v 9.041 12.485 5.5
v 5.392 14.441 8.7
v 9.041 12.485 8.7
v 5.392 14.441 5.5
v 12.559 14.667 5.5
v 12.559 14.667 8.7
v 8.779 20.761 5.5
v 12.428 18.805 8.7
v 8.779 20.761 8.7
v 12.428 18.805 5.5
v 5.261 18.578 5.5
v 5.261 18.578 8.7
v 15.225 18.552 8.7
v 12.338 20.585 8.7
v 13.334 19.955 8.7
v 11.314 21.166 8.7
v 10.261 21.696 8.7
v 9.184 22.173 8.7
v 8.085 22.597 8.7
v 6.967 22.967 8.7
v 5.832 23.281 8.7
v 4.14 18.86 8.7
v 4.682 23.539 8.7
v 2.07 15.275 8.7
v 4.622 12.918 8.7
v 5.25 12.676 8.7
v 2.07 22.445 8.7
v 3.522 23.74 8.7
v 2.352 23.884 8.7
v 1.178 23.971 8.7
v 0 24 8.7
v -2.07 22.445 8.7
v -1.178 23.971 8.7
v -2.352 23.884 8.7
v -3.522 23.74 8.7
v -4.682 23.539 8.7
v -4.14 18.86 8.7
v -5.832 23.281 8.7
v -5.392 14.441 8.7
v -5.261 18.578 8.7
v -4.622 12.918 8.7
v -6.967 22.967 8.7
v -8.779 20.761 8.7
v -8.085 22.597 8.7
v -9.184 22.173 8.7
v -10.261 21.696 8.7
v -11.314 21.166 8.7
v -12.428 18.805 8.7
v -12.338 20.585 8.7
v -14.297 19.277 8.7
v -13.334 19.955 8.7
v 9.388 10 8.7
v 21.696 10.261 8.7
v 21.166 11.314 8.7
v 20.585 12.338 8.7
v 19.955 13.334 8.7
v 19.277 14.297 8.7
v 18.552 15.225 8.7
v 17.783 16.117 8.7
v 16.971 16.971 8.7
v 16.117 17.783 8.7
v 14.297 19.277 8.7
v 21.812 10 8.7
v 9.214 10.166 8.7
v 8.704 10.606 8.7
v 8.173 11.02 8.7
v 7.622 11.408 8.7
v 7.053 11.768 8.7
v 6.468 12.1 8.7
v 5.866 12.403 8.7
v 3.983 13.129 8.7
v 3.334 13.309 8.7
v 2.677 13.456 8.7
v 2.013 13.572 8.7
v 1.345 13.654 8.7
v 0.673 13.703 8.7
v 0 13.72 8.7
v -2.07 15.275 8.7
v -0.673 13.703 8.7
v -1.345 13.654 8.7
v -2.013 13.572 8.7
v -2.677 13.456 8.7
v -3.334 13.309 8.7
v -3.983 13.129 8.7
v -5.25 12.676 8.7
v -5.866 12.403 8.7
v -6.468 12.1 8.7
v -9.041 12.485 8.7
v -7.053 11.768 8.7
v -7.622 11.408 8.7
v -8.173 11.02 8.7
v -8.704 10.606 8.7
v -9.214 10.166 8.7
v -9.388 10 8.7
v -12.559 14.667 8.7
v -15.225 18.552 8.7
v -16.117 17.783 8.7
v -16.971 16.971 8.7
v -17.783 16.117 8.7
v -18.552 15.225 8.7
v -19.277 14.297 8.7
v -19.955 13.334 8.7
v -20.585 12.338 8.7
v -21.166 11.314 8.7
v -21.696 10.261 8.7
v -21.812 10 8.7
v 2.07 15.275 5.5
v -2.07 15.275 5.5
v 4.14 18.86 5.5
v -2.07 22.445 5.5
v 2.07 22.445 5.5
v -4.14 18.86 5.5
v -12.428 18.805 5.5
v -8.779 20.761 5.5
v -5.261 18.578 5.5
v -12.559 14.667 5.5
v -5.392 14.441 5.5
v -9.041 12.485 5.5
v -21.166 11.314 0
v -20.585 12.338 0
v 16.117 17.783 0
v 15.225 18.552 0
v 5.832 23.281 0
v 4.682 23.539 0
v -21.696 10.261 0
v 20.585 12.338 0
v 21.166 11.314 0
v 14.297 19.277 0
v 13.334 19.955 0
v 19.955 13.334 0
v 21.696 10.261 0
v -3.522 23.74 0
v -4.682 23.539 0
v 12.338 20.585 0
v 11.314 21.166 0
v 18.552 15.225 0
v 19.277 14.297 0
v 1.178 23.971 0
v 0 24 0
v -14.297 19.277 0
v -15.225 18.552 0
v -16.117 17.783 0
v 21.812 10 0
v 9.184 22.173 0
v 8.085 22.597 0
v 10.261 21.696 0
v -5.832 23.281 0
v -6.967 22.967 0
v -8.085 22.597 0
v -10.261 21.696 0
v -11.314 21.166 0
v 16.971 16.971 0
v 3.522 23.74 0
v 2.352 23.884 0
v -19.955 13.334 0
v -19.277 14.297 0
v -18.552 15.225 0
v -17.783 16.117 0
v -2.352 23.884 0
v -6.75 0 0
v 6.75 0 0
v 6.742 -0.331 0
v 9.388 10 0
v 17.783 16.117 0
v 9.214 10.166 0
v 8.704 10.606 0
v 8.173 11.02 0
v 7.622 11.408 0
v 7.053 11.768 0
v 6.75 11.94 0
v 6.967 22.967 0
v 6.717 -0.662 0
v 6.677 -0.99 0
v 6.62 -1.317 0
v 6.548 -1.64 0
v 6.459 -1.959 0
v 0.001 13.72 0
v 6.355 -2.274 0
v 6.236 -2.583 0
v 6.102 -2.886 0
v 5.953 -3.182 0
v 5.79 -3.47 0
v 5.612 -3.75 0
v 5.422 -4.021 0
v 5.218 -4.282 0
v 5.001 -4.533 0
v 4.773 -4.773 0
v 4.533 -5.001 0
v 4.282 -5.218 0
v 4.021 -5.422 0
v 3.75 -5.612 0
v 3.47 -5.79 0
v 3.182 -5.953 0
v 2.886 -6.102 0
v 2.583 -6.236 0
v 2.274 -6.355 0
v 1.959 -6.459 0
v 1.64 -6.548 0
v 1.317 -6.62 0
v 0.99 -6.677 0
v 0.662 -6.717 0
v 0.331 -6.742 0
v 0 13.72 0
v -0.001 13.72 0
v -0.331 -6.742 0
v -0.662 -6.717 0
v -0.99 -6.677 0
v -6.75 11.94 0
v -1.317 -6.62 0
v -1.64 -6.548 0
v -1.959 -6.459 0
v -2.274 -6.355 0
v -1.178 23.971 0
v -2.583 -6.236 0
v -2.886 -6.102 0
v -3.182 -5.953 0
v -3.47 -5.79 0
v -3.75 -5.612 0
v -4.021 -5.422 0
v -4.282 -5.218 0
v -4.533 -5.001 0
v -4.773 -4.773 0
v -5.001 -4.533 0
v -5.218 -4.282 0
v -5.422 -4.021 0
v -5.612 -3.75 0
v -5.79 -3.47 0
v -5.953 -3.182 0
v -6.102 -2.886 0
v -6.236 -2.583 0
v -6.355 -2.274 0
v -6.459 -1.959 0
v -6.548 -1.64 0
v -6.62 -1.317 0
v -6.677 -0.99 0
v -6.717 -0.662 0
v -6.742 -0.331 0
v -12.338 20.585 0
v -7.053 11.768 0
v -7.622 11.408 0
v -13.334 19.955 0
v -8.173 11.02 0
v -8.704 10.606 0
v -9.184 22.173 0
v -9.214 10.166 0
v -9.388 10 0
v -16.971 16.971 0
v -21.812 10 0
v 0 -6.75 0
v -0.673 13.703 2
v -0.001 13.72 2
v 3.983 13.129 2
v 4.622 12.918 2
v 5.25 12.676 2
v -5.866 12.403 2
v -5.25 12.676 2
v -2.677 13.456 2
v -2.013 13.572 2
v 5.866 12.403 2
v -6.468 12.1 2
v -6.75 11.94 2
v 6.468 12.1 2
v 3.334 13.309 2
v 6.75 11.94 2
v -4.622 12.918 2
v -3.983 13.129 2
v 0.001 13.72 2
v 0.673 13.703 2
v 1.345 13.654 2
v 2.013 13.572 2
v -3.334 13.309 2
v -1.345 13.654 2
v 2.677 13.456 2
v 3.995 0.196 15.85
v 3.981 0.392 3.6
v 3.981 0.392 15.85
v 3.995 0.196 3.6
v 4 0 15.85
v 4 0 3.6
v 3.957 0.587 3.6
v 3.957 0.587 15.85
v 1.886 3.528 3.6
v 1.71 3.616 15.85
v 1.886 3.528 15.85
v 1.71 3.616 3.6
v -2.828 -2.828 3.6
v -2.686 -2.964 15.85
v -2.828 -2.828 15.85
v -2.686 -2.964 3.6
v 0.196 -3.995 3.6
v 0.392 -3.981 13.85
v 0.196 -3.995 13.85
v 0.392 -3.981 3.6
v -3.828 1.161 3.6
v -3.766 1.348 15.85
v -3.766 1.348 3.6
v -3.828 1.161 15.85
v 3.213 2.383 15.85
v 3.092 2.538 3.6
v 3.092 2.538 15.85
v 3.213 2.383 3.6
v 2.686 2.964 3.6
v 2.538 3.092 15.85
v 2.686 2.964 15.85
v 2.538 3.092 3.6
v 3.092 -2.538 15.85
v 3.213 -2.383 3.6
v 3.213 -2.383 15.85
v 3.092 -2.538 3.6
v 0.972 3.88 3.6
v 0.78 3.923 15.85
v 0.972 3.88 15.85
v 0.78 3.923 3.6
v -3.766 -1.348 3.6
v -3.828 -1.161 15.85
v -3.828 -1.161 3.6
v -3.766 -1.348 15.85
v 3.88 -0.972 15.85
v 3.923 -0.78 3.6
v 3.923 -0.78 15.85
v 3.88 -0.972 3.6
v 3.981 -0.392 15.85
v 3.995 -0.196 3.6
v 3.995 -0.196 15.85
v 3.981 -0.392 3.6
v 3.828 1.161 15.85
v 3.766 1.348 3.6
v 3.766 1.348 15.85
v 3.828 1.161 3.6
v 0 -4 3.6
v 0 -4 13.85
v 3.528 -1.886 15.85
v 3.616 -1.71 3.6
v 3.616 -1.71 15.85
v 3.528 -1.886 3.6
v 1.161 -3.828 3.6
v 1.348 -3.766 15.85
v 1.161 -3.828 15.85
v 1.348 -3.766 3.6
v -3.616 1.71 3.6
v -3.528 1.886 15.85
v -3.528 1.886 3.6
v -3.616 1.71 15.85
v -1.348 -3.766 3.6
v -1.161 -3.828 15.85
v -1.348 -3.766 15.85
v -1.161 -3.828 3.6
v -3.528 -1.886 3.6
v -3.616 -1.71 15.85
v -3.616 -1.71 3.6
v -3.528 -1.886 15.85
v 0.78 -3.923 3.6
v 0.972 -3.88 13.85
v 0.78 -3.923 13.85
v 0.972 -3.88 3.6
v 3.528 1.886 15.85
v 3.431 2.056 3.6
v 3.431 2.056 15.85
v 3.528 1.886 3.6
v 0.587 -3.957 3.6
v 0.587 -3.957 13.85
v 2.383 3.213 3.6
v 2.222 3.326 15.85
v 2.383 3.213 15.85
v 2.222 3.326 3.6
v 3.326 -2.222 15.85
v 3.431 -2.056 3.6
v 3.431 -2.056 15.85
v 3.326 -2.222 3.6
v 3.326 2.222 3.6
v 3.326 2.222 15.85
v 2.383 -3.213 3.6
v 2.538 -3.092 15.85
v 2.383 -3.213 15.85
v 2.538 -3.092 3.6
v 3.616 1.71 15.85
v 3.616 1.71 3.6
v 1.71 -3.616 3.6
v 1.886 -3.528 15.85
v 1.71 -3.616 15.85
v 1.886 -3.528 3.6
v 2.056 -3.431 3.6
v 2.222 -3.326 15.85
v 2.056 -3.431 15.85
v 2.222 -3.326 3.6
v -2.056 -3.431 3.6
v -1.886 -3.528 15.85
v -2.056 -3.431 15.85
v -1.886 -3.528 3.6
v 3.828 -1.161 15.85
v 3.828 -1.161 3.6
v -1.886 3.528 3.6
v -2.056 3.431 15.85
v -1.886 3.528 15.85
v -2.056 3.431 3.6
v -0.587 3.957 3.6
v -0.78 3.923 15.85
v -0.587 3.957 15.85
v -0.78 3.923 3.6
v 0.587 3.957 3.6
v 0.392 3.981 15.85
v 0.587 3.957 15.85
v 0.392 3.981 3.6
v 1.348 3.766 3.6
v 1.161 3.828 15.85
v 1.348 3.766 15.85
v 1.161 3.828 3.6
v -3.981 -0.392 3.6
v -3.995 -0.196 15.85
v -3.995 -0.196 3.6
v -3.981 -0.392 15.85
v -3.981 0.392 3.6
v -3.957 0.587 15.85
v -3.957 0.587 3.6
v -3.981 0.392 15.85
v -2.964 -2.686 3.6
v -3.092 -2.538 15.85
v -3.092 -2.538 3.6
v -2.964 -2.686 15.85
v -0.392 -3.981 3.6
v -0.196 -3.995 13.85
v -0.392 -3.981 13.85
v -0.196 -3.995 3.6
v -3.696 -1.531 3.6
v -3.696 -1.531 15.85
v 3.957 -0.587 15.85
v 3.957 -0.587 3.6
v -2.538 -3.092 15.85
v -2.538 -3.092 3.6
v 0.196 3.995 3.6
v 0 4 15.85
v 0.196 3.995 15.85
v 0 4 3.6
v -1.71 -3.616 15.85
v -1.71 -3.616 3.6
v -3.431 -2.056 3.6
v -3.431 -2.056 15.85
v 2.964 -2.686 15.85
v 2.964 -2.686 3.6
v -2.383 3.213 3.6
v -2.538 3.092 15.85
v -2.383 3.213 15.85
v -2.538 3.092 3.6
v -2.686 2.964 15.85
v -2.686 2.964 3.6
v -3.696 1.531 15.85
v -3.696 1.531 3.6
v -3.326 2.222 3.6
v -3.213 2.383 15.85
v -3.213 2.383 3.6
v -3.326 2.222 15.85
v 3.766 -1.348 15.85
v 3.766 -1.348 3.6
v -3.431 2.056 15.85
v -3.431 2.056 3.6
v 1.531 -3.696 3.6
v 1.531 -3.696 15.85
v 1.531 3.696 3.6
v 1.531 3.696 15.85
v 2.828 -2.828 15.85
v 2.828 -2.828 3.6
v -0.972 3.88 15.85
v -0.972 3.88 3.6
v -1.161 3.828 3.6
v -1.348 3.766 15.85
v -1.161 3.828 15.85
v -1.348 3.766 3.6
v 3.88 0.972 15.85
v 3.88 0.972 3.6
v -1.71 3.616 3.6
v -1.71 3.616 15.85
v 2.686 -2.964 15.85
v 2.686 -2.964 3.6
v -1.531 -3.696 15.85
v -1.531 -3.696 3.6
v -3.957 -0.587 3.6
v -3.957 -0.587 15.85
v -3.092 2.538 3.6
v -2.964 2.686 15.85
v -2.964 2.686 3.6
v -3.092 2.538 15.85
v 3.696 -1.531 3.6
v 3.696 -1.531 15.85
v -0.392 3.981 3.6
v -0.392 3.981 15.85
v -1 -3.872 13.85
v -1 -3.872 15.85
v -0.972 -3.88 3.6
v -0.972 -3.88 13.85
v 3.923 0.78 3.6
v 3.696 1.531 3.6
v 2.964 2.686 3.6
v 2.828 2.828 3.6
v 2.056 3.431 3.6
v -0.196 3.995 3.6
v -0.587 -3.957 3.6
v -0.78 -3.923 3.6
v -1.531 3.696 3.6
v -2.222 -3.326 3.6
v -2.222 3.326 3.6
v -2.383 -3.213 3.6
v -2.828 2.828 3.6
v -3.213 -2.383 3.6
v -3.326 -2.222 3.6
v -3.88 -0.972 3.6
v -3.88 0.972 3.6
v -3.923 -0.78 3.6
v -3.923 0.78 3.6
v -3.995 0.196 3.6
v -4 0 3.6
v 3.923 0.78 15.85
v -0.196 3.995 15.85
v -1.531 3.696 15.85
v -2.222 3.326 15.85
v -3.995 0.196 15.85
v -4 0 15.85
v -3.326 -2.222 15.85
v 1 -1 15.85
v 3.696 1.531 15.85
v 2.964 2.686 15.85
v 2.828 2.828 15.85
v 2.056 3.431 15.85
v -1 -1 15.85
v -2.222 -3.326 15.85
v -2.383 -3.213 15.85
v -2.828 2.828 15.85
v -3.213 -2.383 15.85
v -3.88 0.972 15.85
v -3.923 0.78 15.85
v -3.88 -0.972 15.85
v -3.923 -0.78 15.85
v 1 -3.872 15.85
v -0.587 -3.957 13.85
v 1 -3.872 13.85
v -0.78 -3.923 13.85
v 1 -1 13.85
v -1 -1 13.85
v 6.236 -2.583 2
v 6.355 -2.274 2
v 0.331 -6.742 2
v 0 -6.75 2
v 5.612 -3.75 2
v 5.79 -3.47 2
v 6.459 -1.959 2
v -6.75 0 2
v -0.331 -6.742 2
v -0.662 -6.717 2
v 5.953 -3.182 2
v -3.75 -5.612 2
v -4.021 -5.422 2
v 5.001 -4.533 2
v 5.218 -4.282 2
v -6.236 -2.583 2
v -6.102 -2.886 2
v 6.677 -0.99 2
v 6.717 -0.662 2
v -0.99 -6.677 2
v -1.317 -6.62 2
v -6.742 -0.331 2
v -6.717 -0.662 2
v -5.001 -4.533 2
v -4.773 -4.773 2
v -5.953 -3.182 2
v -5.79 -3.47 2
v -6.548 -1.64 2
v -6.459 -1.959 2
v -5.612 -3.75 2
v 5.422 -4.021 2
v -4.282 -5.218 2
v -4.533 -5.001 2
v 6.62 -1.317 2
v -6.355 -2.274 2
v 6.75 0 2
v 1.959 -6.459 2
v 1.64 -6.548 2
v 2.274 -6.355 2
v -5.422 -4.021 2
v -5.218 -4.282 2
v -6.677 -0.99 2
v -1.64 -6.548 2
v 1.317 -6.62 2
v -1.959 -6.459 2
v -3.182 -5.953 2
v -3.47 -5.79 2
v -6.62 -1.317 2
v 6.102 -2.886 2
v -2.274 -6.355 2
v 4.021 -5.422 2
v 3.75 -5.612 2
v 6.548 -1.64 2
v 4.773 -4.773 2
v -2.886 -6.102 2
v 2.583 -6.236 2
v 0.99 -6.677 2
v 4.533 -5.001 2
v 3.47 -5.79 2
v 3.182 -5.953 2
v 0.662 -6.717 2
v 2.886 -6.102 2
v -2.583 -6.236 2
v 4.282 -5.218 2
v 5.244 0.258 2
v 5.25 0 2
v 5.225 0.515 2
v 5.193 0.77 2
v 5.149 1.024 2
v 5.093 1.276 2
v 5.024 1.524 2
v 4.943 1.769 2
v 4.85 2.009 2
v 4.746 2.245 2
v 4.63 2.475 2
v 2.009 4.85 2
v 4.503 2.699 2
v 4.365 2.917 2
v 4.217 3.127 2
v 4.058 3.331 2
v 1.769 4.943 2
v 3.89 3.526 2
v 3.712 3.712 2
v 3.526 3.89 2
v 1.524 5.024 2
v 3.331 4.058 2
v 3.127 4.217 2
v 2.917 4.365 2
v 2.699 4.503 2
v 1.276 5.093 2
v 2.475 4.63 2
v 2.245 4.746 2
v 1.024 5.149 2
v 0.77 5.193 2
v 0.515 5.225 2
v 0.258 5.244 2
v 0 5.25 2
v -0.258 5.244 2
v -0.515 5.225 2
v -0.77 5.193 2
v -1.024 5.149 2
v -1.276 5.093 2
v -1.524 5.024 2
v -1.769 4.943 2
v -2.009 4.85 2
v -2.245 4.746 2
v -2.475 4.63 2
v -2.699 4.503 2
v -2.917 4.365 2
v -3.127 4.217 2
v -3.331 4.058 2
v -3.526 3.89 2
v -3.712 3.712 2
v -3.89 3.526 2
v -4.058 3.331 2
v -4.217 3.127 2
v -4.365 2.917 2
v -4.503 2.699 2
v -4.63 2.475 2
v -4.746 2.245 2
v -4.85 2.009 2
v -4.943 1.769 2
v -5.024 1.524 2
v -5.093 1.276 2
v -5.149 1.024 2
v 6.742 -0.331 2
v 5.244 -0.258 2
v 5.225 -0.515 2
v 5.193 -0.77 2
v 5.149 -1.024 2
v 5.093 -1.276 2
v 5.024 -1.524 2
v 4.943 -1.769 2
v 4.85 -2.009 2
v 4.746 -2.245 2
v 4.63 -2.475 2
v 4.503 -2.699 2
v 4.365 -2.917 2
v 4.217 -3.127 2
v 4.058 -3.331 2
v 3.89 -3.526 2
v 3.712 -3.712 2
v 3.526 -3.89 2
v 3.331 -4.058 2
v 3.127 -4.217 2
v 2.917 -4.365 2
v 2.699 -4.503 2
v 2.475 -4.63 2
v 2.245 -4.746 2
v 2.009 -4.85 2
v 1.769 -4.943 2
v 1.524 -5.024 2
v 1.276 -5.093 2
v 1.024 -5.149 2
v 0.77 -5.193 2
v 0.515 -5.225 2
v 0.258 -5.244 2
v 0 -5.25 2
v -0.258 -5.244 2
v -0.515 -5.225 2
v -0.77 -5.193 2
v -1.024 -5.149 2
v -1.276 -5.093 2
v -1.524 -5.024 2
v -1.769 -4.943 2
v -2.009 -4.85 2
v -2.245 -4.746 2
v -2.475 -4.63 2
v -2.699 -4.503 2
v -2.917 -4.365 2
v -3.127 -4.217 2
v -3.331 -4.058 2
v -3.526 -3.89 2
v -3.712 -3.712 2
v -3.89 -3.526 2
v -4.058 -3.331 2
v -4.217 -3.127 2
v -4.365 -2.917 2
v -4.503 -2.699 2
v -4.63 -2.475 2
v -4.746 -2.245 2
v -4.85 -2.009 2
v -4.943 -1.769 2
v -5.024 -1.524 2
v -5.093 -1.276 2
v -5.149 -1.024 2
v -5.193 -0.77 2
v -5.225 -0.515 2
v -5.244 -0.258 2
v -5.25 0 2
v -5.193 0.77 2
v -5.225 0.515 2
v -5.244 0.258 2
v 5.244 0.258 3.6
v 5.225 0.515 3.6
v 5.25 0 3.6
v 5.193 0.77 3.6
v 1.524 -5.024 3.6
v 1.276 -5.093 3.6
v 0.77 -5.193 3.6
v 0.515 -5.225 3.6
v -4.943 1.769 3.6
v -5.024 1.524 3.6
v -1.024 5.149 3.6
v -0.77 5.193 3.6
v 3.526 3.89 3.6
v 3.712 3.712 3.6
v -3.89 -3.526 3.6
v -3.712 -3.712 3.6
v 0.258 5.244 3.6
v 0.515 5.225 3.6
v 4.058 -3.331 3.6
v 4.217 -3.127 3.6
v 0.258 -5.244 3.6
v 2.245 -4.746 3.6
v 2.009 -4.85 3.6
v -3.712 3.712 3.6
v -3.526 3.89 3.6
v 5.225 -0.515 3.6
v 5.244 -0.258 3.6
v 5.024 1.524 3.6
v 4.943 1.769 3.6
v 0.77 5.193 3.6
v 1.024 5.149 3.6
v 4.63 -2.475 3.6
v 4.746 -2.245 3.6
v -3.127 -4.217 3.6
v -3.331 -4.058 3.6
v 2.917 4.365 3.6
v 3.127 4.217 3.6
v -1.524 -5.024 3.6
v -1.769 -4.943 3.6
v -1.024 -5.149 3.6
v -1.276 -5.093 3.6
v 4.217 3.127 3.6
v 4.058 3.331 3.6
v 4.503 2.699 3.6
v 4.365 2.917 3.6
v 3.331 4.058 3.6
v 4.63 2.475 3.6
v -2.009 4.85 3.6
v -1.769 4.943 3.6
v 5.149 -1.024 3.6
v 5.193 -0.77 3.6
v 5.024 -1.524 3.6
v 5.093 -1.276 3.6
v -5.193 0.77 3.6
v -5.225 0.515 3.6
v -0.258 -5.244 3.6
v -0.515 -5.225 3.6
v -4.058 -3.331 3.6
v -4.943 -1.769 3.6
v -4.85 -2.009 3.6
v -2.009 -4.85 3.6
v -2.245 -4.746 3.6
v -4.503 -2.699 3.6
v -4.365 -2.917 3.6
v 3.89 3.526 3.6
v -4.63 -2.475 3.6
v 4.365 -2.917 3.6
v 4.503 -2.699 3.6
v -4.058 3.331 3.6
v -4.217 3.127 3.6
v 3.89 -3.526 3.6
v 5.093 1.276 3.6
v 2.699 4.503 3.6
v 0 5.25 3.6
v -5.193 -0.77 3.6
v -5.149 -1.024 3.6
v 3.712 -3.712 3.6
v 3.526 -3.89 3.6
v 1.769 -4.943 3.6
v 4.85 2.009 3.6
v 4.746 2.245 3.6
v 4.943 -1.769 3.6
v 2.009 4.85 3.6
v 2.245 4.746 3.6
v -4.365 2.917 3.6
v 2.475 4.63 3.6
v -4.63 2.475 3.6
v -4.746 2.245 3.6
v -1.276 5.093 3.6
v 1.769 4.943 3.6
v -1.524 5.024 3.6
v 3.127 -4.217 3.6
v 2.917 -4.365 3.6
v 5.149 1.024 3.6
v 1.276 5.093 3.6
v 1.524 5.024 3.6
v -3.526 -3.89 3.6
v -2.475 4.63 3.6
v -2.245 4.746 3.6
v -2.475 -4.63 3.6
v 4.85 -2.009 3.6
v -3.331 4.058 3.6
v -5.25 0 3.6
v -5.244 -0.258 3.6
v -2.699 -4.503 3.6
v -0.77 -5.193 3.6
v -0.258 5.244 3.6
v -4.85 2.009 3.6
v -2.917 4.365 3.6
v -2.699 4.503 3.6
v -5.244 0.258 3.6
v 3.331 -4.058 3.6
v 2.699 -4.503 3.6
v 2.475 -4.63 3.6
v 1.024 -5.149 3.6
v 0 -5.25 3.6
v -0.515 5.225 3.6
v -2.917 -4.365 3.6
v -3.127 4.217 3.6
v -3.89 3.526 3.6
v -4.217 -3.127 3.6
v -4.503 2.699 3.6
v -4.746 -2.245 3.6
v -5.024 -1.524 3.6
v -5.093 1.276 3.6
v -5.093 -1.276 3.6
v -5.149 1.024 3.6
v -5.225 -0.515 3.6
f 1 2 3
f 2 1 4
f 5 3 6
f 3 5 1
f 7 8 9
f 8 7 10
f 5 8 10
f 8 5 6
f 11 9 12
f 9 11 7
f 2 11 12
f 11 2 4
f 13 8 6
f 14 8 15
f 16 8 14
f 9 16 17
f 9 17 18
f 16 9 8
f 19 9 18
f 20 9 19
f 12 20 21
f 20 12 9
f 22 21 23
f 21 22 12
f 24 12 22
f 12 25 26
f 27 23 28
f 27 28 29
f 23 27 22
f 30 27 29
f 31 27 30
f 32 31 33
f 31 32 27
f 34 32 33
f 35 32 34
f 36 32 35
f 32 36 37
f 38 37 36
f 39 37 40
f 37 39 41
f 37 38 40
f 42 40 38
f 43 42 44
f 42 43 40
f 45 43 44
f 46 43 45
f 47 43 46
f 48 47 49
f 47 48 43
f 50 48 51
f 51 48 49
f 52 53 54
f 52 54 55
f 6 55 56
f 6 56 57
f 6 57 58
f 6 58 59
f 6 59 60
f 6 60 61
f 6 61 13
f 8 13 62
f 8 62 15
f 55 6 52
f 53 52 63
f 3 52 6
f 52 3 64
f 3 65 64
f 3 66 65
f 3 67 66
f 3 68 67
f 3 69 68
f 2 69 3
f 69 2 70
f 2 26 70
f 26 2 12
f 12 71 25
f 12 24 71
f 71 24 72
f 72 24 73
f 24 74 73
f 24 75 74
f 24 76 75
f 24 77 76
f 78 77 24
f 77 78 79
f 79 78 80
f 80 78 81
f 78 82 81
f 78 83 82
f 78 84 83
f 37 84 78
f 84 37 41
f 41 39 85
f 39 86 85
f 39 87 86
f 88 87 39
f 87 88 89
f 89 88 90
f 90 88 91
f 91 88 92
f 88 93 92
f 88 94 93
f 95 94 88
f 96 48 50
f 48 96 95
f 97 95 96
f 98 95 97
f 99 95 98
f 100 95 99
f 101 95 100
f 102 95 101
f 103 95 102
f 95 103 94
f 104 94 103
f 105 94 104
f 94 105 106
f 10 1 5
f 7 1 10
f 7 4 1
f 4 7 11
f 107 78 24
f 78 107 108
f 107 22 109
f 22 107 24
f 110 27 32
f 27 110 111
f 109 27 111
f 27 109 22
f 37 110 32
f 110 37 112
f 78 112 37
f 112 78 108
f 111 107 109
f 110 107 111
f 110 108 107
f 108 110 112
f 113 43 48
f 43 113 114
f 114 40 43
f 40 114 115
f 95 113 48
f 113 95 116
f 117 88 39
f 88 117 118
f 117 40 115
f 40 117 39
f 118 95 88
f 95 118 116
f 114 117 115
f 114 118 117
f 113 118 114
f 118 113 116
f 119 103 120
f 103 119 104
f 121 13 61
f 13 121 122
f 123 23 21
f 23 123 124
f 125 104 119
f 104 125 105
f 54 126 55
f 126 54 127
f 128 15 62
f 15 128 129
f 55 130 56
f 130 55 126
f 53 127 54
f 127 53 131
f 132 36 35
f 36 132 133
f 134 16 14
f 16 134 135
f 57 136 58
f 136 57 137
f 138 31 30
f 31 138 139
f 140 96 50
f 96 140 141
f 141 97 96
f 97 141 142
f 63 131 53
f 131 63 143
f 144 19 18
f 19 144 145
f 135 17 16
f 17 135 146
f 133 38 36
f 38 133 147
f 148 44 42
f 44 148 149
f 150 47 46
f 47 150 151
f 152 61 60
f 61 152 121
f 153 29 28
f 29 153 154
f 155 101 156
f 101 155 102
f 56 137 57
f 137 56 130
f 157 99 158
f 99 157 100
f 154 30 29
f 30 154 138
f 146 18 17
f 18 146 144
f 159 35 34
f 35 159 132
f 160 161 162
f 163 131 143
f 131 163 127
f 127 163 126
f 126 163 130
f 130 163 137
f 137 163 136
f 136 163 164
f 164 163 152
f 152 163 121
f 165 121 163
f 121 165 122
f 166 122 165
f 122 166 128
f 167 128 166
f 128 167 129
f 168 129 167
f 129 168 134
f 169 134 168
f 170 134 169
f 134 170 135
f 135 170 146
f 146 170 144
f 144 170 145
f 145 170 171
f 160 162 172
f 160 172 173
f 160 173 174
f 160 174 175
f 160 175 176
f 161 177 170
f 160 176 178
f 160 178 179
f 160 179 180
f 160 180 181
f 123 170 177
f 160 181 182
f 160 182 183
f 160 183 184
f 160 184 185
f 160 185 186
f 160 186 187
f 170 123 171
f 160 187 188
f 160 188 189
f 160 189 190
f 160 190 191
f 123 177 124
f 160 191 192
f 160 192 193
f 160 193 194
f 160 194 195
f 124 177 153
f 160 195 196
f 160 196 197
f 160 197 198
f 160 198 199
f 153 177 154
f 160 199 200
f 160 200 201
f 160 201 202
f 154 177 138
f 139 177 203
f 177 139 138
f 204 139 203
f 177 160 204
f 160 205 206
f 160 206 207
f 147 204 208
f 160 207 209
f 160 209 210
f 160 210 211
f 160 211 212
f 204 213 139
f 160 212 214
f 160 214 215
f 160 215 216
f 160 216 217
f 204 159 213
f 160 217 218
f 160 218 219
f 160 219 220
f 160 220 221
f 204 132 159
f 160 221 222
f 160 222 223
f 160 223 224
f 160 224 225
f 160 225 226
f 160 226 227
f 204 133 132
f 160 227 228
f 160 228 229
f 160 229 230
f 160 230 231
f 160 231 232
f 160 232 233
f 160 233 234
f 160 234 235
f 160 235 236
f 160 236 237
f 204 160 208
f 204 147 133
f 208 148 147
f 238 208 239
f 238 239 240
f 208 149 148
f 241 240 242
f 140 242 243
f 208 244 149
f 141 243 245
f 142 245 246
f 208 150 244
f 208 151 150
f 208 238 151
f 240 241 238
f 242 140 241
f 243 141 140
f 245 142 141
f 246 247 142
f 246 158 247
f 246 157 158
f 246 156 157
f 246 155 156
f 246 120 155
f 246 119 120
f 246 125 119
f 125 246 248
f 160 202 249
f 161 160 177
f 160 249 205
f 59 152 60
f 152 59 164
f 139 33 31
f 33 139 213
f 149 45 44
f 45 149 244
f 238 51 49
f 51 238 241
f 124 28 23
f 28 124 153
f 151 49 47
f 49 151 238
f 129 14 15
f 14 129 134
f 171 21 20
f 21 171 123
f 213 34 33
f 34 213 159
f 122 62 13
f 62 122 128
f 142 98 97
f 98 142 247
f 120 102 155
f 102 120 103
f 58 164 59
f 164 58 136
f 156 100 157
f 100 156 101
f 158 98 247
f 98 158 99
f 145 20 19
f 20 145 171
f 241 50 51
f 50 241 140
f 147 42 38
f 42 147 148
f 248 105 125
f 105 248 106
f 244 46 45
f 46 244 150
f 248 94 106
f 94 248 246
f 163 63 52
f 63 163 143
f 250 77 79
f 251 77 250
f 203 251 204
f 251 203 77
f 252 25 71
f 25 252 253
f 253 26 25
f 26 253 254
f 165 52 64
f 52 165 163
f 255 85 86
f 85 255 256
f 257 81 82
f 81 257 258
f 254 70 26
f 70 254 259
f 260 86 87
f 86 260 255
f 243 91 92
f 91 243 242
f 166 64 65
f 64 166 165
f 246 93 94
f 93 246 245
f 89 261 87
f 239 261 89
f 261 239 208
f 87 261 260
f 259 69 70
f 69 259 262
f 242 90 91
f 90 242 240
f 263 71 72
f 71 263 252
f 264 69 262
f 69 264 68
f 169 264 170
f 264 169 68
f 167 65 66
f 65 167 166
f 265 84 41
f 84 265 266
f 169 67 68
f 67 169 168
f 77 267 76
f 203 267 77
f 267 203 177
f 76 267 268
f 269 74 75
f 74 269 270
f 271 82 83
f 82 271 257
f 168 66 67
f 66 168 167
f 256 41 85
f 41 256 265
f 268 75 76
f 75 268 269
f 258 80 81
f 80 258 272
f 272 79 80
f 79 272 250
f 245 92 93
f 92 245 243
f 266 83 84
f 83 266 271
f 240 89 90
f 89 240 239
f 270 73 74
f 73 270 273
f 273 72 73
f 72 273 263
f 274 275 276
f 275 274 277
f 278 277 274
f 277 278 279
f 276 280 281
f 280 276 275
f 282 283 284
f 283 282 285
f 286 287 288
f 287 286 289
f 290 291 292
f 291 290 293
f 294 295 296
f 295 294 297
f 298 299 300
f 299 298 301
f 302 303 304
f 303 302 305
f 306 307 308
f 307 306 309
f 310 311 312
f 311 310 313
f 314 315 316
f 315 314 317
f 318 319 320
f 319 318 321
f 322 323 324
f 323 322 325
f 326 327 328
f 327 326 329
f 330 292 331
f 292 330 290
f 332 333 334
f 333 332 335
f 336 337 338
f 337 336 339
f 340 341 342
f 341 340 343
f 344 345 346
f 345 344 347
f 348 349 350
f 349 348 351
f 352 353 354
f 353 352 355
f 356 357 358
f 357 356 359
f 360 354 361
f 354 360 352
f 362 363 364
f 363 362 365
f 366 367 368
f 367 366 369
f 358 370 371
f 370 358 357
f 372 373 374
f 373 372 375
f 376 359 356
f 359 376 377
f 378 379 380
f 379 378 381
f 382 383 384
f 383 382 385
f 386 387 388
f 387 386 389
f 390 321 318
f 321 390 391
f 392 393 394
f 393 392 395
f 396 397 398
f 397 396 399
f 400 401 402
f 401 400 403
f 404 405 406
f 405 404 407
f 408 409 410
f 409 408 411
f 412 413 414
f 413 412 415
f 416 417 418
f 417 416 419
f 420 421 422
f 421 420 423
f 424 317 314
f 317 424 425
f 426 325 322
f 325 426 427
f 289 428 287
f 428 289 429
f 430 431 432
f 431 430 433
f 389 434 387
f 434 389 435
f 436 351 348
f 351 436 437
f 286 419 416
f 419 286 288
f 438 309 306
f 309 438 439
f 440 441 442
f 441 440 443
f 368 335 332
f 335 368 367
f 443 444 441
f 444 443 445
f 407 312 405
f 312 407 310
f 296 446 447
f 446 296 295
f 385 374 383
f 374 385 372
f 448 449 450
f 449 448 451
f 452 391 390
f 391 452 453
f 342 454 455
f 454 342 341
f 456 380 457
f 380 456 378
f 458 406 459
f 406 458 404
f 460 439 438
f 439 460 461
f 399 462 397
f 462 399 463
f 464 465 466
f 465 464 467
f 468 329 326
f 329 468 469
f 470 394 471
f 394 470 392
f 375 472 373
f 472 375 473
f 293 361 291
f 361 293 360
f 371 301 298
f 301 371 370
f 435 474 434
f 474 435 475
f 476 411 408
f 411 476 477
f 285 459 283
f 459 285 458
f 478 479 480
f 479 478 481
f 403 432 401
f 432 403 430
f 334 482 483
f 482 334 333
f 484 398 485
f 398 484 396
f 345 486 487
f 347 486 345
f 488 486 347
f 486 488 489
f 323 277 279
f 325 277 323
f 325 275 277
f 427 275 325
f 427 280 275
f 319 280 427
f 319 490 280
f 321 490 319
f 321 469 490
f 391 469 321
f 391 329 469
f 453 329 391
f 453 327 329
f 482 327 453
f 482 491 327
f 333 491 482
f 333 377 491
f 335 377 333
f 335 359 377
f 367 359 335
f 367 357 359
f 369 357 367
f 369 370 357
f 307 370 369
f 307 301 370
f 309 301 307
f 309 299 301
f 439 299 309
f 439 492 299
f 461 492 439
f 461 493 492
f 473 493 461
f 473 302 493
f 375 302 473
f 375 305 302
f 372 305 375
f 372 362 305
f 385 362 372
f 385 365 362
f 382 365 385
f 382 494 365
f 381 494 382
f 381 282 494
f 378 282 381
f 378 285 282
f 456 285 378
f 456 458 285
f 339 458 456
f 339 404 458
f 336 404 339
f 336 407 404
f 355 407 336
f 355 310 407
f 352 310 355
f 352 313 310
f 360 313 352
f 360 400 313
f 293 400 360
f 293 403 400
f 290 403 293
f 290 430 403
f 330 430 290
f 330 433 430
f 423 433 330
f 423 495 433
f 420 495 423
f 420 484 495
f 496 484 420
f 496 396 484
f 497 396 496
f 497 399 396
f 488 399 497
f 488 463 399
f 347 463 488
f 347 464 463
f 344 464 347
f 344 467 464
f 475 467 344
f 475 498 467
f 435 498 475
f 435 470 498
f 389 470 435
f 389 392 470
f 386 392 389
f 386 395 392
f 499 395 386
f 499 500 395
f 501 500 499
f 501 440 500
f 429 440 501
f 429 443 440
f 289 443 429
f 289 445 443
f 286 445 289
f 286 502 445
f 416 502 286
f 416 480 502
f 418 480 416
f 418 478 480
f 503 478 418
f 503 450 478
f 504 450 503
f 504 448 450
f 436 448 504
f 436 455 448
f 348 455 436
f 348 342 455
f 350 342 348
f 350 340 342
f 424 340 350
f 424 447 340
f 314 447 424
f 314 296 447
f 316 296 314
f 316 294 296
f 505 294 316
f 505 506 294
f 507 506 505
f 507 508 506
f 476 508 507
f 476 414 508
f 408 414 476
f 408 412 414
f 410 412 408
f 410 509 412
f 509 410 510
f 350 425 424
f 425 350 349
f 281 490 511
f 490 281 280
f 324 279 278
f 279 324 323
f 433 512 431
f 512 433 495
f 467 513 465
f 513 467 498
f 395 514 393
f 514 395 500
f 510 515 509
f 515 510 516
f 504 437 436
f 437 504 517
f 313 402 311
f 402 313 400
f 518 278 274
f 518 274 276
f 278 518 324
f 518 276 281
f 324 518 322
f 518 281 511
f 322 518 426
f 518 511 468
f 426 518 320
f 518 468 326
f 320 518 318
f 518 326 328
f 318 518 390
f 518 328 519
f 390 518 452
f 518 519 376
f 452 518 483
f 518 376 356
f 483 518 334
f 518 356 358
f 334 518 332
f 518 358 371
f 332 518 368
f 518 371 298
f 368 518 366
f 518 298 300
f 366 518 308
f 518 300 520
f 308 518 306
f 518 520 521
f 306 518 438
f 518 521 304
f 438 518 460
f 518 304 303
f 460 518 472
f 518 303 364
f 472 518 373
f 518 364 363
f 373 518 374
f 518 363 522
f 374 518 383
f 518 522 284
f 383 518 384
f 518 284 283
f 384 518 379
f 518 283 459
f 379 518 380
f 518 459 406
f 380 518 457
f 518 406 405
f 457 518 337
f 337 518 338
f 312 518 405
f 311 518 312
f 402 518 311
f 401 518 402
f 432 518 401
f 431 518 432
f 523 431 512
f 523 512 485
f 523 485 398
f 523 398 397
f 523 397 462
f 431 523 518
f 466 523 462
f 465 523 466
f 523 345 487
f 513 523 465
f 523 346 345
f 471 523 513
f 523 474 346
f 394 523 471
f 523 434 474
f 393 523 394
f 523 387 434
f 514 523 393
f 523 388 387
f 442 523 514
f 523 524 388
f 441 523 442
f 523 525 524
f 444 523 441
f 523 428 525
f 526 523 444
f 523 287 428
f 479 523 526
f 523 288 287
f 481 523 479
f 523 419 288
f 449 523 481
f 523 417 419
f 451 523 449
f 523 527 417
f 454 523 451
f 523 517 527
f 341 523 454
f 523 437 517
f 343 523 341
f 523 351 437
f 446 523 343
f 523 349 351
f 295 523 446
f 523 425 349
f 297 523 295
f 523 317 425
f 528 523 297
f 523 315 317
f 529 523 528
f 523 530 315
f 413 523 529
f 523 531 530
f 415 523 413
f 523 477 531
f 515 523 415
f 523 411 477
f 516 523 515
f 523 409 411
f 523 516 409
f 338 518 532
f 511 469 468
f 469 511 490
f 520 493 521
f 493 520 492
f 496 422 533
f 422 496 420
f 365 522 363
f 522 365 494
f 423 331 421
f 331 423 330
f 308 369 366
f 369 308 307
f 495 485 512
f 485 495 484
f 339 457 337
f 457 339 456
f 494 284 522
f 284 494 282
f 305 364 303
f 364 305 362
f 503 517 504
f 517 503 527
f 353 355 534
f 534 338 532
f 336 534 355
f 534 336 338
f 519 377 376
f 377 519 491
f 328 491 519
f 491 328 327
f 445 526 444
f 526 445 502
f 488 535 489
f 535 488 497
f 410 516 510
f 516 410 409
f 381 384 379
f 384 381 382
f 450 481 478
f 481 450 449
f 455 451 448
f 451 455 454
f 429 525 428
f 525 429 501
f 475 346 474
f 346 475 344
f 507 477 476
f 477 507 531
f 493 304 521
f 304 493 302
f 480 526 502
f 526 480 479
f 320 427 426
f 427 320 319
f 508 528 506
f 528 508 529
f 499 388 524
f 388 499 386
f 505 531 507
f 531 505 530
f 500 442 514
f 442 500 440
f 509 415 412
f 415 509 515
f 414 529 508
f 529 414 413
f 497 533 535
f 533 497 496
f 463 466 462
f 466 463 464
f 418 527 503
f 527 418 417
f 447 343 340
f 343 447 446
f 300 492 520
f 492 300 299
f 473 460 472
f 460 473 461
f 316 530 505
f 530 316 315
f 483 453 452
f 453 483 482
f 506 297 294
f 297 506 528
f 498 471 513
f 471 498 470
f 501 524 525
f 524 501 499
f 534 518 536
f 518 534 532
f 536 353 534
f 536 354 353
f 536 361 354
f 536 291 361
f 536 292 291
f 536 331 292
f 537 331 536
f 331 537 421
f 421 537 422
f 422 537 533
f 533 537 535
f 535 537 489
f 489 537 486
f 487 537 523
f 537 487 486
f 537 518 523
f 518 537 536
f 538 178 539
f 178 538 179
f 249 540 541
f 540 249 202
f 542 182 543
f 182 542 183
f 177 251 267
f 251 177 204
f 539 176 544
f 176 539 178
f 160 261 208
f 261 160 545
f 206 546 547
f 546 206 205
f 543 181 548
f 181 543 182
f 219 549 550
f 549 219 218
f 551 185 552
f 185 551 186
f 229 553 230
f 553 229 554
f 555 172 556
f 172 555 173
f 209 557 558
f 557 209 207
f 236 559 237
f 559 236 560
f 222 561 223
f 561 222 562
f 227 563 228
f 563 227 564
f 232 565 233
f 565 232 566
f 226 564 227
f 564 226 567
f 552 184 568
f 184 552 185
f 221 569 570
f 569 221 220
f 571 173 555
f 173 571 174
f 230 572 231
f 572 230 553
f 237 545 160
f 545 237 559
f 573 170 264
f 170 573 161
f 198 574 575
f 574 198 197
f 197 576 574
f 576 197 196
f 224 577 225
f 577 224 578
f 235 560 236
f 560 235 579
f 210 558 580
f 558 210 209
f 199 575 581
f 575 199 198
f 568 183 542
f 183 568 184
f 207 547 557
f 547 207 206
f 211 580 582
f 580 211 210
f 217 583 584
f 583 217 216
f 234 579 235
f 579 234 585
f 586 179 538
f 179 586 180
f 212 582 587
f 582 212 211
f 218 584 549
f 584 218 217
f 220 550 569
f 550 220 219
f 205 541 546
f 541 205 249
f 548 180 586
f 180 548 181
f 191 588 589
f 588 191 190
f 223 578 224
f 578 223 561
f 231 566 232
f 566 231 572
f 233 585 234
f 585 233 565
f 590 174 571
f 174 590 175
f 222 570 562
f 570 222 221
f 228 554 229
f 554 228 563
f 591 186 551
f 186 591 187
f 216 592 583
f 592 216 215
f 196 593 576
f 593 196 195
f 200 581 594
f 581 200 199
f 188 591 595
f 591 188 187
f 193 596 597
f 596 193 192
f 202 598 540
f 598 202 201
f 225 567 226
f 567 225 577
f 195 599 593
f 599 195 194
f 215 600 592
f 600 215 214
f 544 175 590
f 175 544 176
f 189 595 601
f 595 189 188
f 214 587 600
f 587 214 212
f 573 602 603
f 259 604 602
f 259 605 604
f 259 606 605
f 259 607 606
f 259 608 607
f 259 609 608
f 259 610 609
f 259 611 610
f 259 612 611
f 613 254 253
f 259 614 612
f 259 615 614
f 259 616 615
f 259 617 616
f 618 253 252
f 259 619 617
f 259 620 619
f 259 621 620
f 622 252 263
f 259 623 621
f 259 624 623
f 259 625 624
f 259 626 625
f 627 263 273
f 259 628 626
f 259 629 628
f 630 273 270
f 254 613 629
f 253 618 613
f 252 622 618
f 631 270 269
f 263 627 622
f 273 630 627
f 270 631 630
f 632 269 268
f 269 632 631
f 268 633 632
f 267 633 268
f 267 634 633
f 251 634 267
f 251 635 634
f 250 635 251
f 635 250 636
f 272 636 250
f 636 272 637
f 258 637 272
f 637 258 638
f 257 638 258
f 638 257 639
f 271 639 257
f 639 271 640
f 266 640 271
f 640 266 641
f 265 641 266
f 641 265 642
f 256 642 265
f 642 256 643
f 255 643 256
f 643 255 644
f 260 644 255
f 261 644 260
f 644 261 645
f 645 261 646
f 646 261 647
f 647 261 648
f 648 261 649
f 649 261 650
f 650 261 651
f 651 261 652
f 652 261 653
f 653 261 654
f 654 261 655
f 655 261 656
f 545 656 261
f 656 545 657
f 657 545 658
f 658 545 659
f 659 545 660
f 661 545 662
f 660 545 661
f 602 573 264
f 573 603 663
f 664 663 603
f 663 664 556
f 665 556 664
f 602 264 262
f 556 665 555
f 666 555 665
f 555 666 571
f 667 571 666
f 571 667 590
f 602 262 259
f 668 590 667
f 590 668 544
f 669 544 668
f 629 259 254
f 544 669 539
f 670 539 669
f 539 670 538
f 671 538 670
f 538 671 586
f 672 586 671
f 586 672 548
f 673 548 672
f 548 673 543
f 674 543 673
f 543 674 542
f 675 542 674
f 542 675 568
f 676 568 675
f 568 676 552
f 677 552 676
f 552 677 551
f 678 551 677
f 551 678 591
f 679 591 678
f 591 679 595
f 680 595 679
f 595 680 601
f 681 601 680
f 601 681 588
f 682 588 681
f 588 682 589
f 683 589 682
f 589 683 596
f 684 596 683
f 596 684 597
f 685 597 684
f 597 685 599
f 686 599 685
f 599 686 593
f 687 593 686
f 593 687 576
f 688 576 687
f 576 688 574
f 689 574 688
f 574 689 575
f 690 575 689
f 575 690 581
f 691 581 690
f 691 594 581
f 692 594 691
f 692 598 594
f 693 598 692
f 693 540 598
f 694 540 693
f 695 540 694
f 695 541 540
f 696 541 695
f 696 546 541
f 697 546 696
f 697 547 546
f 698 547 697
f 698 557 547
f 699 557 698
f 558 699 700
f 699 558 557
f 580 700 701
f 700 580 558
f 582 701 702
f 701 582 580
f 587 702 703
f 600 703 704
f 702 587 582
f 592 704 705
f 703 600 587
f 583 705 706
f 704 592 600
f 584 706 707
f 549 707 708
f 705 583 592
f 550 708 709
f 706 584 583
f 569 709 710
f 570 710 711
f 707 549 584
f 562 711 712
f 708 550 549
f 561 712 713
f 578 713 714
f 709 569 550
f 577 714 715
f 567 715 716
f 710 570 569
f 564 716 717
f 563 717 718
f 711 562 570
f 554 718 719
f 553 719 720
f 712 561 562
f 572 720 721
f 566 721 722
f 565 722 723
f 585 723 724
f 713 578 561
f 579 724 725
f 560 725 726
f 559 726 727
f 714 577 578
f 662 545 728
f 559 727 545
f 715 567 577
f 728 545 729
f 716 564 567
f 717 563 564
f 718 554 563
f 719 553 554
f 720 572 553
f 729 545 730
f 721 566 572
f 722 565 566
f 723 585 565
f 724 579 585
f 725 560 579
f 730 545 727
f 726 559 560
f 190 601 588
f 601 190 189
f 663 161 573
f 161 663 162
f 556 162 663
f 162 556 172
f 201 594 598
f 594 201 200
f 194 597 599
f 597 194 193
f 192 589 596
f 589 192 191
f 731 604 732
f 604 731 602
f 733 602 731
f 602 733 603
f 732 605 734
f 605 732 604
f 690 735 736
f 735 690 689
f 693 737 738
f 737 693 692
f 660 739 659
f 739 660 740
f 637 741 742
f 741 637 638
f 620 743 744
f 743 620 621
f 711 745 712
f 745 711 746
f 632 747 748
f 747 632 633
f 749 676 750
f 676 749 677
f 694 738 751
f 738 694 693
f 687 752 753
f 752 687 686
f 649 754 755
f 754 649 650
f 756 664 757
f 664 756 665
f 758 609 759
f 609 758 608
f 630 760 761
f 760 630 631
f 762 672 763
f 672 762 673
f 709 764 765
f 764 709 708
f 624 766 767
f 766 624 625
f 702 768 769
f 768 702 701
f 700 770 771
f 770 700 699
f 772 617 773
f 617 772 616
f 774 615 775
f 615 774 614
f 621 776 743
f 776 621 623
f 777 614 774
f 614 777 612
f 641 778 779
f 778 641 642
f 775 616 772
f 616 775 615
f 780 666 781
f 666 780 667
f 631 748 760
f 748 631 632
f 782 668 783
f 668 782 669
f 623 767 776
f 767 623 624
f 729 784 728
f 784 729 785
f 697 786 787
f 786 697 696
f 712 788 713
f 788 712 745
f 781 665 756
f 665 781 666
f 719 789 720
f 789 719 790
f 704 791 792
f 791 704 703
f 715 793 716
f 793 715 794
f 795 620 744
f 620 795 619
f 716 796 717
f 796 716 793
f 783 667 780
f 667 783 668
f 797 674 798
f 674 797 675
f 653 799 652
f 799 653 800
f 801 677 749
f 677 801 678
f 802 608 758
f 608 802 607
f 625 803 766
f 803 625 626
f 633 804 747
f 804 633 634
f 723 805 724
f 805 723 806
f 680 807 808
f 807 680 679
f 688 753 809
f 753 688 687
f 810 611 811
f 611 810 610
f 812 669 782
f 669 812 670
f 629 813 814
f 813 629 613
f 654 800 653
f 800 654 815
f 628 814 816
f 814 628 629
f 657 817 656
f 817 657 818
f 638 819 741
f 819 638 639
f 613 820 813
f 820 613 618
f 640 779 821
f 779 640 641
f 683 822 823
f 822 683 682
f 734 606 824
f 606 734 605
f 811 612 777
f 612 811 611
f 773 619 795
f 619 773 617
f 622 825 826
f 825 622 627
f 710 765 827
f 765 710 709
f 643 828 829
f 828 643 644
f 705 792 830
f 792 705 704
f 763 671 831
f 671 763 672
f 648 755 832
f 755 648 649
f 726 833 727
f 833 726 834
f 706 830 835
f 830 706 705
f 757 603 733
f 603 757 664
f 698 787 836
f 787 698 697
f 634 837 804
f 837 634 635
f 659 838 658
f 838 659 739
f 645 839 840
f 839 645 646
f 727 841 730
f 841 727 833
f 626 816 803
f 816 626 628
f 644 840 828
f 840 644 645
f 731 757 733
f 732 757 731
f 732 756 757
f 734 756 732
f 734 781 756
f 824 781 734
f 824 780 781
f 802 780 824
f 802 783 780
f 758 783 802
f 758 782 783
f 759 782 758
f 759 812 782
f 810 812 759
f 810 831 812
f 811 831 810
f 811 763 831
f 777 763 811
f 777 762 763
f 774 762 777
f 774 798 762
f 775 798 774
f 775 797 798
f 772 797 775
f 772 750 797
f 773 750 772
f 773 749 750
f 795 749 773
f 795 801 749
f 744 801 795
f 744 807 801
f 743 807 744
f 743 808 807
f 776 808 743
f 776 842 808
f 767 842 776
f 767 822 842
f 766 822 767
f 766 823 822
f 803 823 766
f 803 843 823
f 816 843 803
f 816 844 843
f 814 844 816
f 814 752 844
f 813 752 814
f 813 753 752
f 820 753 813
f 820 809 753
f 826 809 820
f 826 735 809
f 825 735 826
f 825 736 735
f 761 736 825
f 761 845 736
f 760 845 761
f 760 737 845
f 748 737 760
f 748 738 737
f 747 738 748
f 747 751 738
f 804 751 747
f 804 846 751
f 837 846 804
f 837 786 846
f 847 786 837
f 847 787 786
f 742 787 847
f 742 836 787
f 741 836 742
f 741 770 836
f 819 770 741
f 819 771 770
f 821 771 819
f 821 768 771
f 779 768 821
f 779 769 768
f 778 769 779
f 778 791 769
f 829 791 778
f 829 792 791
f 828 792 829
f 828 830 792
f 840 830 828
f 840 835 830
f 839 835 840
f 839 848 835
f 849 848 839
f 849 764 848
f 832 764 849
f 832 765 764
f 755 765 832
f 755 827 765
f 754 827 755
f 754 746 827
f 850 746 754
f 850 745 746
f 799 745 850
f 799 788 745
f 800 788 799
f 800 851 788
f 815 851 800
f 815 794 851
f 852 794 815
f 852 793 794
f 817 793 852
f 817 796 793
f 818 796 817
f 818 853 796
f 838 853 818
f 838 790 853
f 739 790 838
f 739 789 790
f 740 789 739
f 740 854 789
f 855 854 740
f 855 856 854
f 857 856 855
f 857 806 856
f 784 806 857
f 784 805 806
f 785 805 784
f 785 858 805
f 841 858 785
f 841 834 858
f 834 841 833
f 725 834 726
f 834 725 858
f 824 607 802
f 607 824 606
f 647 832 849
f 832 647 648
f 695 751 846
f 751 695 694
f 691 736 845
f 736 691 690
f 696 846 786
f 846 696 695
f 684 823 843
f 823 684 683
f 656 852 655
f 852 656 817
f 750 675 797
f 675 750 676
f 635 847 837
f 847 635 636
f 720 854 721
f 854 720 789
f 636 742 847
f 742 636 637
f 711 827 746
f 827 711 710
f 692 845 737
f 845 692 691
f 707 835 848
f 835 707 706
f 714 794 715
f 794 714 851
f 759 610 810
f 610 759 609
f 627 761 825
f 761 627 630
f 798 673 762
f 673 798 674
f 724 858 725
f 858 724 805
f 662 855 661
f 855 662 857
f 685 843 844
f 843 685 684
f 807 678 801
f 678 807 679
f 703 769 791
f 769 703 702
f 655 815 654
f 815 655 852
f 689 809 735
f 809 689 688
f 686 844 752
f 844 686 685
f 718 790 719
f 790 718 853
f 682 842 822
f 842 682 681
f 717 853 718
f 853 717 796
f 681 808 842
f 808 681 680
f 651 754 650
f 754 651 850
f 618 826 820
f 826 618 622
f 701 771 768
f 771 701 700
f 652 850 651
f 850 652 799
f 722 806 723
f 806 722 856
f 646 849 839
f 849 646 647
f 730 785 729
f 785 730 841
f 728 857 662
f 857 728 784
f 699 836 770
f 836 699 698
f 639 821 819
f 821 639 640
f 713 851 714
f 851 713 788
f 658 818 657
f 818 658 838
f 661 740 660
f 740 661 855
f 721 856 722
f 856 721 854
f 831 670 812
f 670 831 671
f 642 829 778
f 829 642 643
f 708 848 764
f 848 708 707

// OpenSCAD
// file: centercap_params.scad
// General parameters
tiny = 0.01;

// Bearing parameters
bearing_outer_diam = 22;
bearing_inner_diam = 8;
bearing_height = 7;
bearing_tolerance= 0.1;

// Base parameters
base_height = 2;
outer_diam = 65;

bearing_wall_width = 2.5;

inner_ring_height = 10;
inner_ring_diam = 56;
inner_ring_wall_width = 2;

number_of_clips = 4;
clip_clearance = 2;
clip_length = 13;
clip_height = 12;
clip_width = 1.4;
clip_straight_height = 4.5;
clip_slant_height = 5;

// Swing parameters
arm_width = 13.5;
arm_clearance = 2;
arm_length = inner_ring_diam / 2 - inner_ring_wall_width - arm_clearance;
arm_height = 3;

bearing_start_z_offset = 1.6;
bearing_z_start = arm_height + bearing_start_z_offset;
bearing_z_mid = bearing_z_start + bearing_height / 2;

nuts_per_side = 2;
nut_width = 8.08; // Measured corner to corner
nut_height = 3.2;
nut_hole_size = 4.2;
nut_tolerance = 0.2;
nut_loose_width = nut_width + nut_tolerance;
nut_clearance = 0.1;
screw_head_height = 2 * 3.2;

swing_clearance = 1;
swing_height = bearing_height + arm_height + bearing_start_z_offset - swing_clearance - screw_head_height;//bearing_z_mid + nut_height / 2;

shaft_height = 12.25;
notch_size = 2;
notch_length = 3;

swing_inner_radius = arm_length - nut_loose_width - 2 * nut_clearance;

// Top parameters
endcap_tolerance = 0.4;
endcap_height = 1;

bottom_height = 2;

mid_diam = 20;
mid_height = 1.5;

top_diam = 10.5;
top_height = 1.1;

endcap_hole_height = bottom_height + mid_height + top_height - endcap_height;

// Curved VW parameters
logo_height = 1;
dome_height = 4;
// main file
include <centercap_params.scad>

$fn = $preview ? 16 : 128;

inner_ring_wall_width = 2;

arm_width = 13.5;
arm_clearance = 2;
arm_length = inner_ring_diam / 2 - inner_ring_wall_width - arm_clearance;
arm_height = 2;
echo(arm_length);

bearing_outer_diam = 22;
bearing_inner_diam = 8;
bearing_height = 7;

bearing_start_z_offset = 1.6;
bearing_z_start = arm_height + bearing_start_z_offset;
bearing_z_mid = bearing_z_start + bearing_height / 2;

nut_width = 8.08; // Measured corner to corner
nut_height = 3.2;
nut_hole_size = 3;//3.25;
nut_tolerance = 0.2;
nut_loose_width = nut_width + nut_tolerance;
nut_clearance = 1;

swing_height = bearing_z_mid + nut_height / 2;

shaft_height = 12.25;
notch_size = 2;
notch_length = 3;

swing_inner_diam = arm_length - nut_loose_width - 2 * nut_clearance; // TODO change name or *2
echo("Swing inner diam:", swing_inner_diam);

if(swing_inner_diam  * 2 <= bearing_outer_diam){
    echo("Warning: Bearing might not fit!!");
}

linear_extrude(arm_height){
    circle( d=arm_width);
    
    translate([-arm_width / 2, 0, 0])
    square([arm_width, swing_inner_diam]);
}

translate([0, 0, 0])
difference() {
    cylinder(h=swing_height, r= arm_length);
        
    translate([arm_length, 10, 0])
    rotate([0, 0, 180])
    cube([2 * arm_length, 2 * arm_length, swing_height]);
        
    cylinder(h= swing_height, r = swing_inner_diam);
            
    // Nut holes ;)
    num_nuts = 1;
    angle = (nut_loose_width + nut_clearance) /
    ((swing_inner_diam + nut_clearance + nut_loose_width / 2) * 2 * PI) * 360; // TODO check
    echo("Angle: ", angle);
    for(i=[-num_nuts: num_nuts]){
        rotate([0, 0, i * angle]) 
        translate([0, arm_length - nut_loose_width / 2 - nut_clearance, bearing_z_mid - nut_height / 2])
        cylinder(h=nut_height, d=nut_loose_width, $fn=6); 

    }
}

x = 1.6;
    
translate([0, 0, arm_height])
cylinder(bearing_start_z_offset, d=10.5);

translate([0, 0, bearing_z_start])
difference() {
    cylinder(shaft_height, d=bearing_inner_diam);

    translate([-notch_size/2, -(bearing_inner_diam / 2), shaft_height - notch_size])
    cube([notch_size, notch_length, notch_size], center=false);

}
